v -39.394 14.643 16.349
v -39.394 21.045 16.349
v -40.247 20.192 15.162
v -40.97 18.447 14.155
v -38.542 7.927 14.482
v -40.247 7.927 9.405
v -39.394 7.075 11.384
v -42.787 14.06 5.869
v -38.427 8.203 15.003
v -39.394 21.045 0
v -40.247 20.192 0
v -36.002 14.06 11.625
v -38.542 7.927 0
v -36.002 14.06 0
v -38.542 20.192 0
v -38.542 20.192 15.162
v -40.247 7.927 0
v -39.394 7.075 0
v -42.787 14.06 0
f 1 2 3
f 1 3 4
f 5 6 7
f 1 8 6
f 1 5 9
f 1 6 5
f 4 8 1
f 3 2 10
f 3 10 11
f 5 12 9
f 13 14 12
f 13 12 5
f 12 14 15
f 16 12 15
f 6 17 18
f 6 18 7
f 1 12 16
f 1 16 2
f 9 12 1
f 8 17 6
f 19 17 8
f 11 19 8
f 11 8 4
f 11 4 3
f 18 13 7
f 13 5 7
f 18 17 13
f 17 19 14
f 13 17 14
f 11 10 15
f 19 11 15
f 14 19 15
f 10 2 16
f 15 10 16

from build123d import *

# Parameters (mm, degrees)
F0_W        = 8.89
F0_H        = 15.24
F1_DEPTH    = 10.16
F3_DEPTH    = 15.24
F4_T1_DEPTH = 36.2882991577
F5_T1_DEPTH = 36.5015311919
F6_T1_DEPTH = 33.8737387742


# Not quite as in the source:
# - a fillet or chamfer that OpenCascade refuses, or shapes differently, is made with other operations: its cross-section is extruded or revolved along the edge and cut away or added


with BuildPart() as f1:
    # F0 (on Top) → F1 (new body)
    with BuildSketch(Plane.XY):
        with Locations((-39.3944829702, 14.0595820769)):
            Rectangle(F0_W, F0_H)
    extrude(amount=F1_DEPTH)

    # F2 (on face) → F3 (join)
    with BuildSketch(Plane.XZ.offset(-6.4395820769)):
        Polygon((-43.8394829702, 10.16), (-34.9494829702, 10.16), (-39.3944829702, 16.349214409), align=None)
    extrude(amount=-F3_DEPTH)

    # F4: chamfer of 5.08 on 4 edges, made by hand

    # F4_s2 → F4_t1 (cut)
    with BuildSketch(Plane.XY.offset(-13.0641495789)):
        Polygon((-34.9494829702, 11.5195820769), (-40.0294829702, 6.4395820769), (-34.9494829702, 6.4395820769), align=None)
        Polygon((-43.8394829702, 11.5195820769), (-38.7594829702, 6.4395820769), (-43.8394829702, 6.4395820769), align=None)
        Polygon((-40.0294829702, 21.6795820769), (-34.9494829702, 16.5995820769), (-34.9494829702, 21.6795820769), align=None)
        Polygon((-38.7594829702, 21.6795820769), (-43.8394829702, 16.5995820769), (-43.8394829702, 21.6795820769), align=None)
    extrude(amount=F4_T1_DEPTH, mode=Mode.SUBTRACT)

    # F5: chamfer of 5.08 on 4 edges, made by hand

    # F5_s2 → F5_t1 (cut)
    with BuildSketch(Plane.XY.offset(-13.170765596)):
        Polygon((-34.9494829702, 11.5195820769), (-38.5415854186, 20.1916845253), (-34.9494829702, 16.5995820769), align=None)
        Polygon((-34.9494829702, 16.5995820769), (-38.5415854186, 7.9274796285), (-34.9494829702, 11.5195820769), align=None)
        Polygon((-40.2473805218, 7.9274796285), (-43.8394829702, 16.5995820769), (-43.8394829702, 11.5195820769), align=None)
        Polygon((-43.8394829702, 11.5195820769), (-40.2473805218, 20.1916845253), (-43.8394829702, 16.5995820769), align=None)
    extrude(amount=F5_T1_DEPTH, mode=Mode.SUBTRACT)

    # F6: chamfer of 5.08 on 1 edges, made by hand

    # F6_s2 → F6_t1 (cut)
    with BuildSketch(Plane(origin=(-11.3557841109, 27.415288012, -15.8117846218), x_dir=(0.9238795325, 0.3826834324, 0), z_dir=(0.3377298738, -0.8153520418, 0.4702548035))):
        Polygon((-34.1500159871, 18.9876434675), (-30.7922479627, 27.8797024774), (-34.1500159871, 24.0676434675), align=None)
    extrude(amount=F6_T1_DEPTH, mode=Mode.SUBTRACT)


solid = f1.part
